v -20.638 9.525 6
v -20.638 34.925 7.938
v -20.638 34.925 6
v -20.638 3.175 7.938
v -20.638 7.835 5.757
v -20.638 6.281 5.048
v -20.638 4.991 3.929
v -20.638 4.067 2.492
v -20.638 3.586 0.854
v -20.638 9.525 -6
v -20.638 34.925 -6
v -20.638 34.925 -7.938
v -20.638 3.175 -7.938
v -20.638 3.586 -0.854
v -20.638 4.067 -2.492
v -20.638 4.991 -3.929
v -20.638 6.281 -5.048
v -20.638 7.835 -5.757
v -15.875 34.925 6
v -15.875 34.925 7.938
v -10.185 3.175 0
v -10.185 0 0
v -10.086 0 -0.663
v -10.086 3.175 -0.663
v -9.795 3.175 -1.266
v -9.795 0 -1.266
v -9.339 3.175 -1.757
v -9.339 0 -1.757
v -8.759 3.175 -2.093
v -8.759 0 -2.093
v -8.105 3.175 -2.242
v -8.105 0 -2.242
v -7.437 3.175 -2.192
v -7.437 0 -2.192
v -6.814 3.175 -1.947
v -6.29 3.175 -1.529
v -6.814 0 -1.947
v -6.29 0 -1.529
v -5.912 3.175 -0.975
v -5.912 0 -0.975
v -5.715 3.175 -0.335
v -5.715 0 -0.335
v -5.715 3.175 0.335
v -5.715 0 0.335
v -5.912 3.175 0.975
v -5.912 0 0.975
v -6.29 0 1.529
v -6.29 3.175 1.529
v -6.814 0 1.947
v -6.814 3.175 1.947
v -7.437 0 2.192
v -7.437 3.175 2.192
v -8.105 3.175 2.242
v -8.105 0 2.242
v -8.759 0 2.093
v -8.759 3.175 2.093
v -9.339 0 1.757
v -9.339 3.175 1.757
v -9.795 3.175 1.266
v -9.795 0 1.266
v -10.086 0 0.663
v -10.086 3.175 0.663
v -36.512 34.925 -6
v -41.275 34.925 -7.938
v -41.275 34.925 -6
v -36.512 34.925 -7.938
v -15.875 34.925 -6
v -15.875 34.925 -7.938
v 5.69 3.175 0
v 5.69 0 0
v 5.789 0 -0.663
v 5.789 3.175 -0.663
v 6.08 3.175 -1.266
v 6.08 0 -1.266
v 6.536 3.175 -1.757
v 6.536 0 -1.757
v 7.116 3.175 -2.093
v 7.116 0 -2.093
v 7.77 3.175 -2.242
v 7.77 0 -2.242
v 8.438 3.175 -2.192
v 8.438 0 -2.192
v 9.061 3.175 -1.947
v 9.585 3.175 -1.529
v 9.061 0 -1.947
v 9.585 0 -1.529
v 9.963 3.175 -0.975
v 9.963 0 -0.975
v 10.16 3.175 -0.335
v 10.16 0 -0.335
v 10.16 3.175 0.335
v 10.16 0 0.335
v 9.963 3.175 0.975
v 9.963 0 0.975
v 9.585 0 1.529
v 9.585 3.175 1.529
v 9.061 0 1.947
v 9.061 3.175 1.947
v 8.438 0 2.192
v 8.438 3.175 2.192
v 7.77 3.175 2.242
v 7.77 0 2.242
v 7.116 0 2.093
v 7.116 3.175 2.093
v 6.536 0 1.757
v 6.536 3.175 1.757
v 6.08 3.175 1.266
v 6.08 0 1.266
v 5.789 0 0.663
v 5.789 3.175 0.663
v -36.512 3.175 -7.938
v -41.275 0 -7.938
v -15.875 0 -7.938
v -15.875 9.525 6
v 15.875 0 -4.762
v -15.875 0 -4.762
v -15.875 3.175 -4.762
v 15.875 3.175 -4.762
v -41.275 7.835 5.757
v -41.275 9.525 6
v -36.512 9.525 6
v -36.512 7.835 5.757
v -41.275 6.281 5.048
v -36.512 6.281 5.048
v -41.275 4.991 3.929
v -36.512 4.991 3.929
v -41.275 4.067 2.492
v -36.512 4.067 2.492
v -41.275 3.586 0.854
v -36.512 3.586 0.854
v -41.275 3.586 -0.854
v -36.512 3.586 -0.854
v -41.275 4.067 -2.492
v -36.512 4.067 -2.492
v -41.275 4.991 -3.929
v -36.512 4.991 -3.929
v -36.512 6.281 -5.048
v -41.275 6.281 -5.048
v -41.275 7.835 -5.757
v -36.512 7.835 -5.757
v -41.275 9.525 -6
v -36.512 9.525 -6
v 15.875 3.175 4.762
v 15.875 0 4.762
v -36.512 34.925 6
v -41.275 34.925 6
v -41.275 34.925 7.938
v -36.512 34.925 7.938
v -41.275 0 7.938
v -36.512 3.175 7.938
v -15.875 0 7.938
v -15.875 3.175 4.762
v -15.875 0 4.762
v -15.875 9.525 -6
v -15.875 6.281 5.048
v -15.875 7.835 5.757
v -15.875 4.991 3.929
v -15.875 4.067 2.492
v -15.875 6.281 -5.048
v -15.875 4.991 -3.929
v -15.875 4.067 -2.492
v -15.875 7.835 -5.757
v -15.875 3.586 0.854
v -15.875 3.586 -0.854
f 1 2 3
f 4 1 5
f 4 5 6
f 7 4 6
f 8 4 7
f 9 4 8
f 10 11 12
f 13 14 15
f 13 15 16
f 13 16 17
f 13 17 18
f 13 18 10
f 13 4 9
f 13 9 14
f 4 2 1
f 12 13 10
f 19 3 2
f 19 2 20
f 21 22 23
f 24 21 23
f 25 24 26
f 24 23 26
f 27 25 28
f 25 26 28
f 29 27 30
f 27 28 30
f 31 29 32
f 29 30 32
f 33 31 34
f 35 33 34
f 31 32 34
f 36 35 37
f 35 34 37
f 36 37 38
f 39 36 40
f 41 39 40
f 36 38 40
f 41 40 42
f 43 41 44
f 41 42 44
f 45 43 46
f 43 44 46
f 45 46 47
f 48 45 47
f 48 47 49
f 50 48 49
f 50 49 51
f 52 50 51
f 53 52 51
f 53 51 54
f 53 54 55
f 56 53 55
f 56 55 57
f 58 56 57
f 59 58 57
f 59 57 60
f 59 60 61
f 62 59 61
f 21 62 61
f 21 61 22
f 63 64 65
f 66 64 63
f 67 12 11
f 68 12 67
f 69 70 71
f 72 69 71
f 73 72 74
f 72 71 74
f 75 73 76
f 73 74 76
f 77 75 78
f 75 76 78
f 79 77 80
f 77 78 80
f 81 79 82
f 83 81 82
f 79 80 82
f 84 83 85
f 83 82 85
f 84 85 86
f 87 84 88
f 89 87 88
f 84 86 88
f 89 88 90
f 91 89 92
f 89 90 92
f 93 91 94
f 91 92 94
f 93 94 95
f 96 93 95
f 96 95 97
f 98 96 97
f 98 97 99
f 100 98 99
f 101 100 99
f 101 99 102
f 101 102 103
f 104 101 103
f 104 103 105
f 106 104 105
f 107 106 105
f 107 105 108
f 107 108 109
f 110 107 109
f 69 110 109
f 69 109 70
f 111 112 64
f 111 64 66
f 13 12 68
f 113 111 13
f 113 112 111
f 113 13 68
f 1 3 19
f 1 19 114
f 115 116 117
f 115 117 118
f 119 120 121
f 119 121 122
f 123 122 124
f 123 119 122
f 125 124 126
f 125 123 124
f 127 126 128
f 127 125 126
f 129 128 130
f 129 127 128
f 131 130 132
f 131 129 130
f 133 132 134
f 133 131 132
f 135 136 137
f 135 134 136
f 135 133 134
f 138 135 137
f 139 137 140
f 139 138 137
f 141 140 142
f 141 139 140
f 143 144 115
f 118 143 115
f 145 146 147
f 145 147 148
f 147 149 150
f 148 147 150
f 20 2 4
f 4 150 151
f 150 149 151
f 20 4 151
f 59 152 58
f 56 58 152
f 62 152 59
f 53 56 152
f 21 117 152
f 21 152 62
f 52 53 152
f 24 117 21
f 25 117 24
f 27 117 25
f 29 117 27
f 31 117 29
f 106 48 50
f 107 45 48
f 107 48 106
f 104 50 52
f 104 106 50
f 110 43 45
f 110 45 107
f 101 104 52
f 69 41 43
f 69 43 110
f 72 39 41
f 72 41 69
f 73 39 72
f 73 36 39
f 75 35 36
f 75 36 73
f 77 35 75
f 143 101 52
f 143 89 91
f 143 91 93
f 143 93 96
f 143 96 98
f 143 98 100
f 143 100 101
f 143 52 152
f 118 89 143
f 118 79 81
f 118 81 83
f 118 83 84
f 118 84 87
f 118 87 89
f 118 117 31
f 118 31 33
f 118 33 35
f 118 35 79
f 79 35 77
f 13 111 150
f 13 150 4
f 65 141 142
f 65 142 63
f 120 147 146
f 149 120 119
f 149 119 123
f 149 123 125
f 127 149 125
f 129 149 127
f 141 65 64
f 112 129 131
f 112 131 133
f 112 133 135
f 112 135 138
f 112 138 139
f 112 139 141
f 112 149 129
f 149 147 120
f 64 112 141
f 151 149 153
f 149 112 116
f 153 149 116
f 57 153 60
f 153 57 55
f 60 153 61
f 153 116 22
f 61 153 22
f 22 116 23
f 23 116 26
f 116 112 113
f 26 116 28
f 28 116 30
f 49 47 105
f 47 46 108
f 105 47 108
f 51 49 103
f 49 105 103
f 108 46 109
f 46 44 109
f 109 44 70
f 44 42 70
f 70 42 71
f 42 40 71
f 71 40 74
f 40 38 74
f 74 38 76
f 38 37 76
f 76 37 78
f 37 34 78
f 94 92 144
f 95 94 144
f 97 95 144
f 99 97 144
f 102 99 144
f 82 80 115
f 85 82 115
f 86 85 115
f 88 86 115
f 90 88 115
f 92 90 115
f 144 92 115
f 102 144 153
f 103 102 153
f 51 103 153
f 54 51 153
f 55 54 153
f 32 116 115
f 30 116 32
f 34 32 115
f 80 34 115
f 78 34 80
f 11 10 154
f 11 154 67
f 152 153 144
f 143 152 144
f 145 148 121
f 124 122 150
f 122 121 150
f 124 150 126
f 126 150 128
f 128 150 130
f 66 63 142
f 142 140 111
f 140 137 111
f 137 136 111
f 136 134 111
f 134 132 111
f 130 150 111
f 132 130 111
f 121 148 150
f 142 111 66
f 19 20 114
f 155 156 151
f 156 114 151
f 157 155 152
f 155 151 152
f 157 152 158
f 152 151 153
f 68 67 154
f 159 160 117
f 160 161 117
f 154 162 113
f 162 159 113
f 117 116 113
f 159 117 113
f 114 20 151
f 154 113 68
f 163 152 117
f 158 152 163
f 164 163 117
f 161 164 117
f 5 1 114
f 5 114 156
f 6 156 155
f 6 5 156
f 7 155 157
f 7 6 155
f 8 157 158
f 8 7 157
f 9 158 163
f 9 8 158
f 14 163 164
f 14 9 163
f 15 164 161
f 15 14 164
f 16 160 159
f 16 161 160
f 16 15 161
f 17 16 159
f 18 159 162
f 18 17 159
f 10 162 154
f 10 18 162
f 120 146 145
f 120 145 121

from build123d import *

# Parameters (mm, degrees)
SKETCH1_W             = 31.75
SKETCH1_H             = 9.525
BOSS_EXTRUDE1_DEPTH   = 3.175
F_8_CLEARANCE_HOLE1_D = 4.4958
SKETCH4_W             = 25.4
SKETCH4_H             = 15.875
BOSS_EXTRUDE2_DEPTH   = 3.175
SKETCH5_W             = 4.7625
SKETCH5_H             = 15.875
BOSS_EXTRUDE3_DEPTH   = 31.75
CUT_EXTRUDE1_DEPTH    = 68.445400371
LPATTERN1_COUNT       = 2
LPATTERN1_PITCH       = 20.6375


with BuildPart() as part:
    # Sketch1 → Boss-Extrude1 (new body)
    with BuildSketch(Plane(origin=(0, 0, 0), x_dir=(1, 0, 0), z_dir=(0, 1, 0))):
        Rectangle(SKETCH1_W, SKETCH1_H)
    extrude(amount=BOSS_EXTRUDE1_DEPTH)

    # #8 Clearance Hole1 (through all)
    with Locations(Plane(origin=(0, 3.175, 0), x_dir=(1, 0, 0), z_dir=(0, 1, 0))):
        with Locations((-7.9375, 0), (7.9375, 0)):
            Hole(F_8_CLEARANCE_HOLE1_D / 2)

    # Sketch4 → Boss-Extrude2 (add)
    with BuildSketch(Plane(origin=(0, 0, 0), x_dir=(1, 0, 0), z_dir=(0, 1, 0))):
        with Locations((-28.575, 0)):
            Rectangle(SKETCH4_W, SKETCH4_H)
    extrude(amount=BOSS_EXTRUDE2_DEPTH)

    # Sketch5 → Boss-Extrude3 (add)
    with BuildSketch(Plane(origin=(0, 3.175, 0), x_dir=(1, 0, 0), z_dir=(0, 1, 0))):
        with Locations((-38.89375, 0)):
            Rectangle(SKETCH5_W, SKETCH5_H)
    boss_extrude3 = extrude(amount=BOSS_EXTRUDE3_DEPTH)

    # Sketch7 → Cut-Extrude1 (cut, through all)
    with BuildSketch(Plane.ZY.offset(41.275)):
        with BuildLine():
            Line((6, 34.925), (6, 9.525))
            ThreePointArc((6, 9.525), (0, 3.525), (-6, 9.525))
            Line((-6, 9.525), (-6, 34.925))
            ThreePointArc((-6, 34.925), (0, 40.925), (6, 34.925))
        make_face()
    cut_extrude1 = extrude(amount=-CUT_EXTRUDE1_DEPTH, mode=Mode.SUBTRACT)

    # LPattern1: Boss-Extrude3, Cut-Extrude1 ×2
    with Locations(*[(i * LPATTERN1_PITCH, 0, 0) for i in range(1, LPATTERN1_COUNT)]):
        add(boss_extrude3)
        add(cut_extrude1, mode=Mode.SUBTRACT)


solid = part.part
